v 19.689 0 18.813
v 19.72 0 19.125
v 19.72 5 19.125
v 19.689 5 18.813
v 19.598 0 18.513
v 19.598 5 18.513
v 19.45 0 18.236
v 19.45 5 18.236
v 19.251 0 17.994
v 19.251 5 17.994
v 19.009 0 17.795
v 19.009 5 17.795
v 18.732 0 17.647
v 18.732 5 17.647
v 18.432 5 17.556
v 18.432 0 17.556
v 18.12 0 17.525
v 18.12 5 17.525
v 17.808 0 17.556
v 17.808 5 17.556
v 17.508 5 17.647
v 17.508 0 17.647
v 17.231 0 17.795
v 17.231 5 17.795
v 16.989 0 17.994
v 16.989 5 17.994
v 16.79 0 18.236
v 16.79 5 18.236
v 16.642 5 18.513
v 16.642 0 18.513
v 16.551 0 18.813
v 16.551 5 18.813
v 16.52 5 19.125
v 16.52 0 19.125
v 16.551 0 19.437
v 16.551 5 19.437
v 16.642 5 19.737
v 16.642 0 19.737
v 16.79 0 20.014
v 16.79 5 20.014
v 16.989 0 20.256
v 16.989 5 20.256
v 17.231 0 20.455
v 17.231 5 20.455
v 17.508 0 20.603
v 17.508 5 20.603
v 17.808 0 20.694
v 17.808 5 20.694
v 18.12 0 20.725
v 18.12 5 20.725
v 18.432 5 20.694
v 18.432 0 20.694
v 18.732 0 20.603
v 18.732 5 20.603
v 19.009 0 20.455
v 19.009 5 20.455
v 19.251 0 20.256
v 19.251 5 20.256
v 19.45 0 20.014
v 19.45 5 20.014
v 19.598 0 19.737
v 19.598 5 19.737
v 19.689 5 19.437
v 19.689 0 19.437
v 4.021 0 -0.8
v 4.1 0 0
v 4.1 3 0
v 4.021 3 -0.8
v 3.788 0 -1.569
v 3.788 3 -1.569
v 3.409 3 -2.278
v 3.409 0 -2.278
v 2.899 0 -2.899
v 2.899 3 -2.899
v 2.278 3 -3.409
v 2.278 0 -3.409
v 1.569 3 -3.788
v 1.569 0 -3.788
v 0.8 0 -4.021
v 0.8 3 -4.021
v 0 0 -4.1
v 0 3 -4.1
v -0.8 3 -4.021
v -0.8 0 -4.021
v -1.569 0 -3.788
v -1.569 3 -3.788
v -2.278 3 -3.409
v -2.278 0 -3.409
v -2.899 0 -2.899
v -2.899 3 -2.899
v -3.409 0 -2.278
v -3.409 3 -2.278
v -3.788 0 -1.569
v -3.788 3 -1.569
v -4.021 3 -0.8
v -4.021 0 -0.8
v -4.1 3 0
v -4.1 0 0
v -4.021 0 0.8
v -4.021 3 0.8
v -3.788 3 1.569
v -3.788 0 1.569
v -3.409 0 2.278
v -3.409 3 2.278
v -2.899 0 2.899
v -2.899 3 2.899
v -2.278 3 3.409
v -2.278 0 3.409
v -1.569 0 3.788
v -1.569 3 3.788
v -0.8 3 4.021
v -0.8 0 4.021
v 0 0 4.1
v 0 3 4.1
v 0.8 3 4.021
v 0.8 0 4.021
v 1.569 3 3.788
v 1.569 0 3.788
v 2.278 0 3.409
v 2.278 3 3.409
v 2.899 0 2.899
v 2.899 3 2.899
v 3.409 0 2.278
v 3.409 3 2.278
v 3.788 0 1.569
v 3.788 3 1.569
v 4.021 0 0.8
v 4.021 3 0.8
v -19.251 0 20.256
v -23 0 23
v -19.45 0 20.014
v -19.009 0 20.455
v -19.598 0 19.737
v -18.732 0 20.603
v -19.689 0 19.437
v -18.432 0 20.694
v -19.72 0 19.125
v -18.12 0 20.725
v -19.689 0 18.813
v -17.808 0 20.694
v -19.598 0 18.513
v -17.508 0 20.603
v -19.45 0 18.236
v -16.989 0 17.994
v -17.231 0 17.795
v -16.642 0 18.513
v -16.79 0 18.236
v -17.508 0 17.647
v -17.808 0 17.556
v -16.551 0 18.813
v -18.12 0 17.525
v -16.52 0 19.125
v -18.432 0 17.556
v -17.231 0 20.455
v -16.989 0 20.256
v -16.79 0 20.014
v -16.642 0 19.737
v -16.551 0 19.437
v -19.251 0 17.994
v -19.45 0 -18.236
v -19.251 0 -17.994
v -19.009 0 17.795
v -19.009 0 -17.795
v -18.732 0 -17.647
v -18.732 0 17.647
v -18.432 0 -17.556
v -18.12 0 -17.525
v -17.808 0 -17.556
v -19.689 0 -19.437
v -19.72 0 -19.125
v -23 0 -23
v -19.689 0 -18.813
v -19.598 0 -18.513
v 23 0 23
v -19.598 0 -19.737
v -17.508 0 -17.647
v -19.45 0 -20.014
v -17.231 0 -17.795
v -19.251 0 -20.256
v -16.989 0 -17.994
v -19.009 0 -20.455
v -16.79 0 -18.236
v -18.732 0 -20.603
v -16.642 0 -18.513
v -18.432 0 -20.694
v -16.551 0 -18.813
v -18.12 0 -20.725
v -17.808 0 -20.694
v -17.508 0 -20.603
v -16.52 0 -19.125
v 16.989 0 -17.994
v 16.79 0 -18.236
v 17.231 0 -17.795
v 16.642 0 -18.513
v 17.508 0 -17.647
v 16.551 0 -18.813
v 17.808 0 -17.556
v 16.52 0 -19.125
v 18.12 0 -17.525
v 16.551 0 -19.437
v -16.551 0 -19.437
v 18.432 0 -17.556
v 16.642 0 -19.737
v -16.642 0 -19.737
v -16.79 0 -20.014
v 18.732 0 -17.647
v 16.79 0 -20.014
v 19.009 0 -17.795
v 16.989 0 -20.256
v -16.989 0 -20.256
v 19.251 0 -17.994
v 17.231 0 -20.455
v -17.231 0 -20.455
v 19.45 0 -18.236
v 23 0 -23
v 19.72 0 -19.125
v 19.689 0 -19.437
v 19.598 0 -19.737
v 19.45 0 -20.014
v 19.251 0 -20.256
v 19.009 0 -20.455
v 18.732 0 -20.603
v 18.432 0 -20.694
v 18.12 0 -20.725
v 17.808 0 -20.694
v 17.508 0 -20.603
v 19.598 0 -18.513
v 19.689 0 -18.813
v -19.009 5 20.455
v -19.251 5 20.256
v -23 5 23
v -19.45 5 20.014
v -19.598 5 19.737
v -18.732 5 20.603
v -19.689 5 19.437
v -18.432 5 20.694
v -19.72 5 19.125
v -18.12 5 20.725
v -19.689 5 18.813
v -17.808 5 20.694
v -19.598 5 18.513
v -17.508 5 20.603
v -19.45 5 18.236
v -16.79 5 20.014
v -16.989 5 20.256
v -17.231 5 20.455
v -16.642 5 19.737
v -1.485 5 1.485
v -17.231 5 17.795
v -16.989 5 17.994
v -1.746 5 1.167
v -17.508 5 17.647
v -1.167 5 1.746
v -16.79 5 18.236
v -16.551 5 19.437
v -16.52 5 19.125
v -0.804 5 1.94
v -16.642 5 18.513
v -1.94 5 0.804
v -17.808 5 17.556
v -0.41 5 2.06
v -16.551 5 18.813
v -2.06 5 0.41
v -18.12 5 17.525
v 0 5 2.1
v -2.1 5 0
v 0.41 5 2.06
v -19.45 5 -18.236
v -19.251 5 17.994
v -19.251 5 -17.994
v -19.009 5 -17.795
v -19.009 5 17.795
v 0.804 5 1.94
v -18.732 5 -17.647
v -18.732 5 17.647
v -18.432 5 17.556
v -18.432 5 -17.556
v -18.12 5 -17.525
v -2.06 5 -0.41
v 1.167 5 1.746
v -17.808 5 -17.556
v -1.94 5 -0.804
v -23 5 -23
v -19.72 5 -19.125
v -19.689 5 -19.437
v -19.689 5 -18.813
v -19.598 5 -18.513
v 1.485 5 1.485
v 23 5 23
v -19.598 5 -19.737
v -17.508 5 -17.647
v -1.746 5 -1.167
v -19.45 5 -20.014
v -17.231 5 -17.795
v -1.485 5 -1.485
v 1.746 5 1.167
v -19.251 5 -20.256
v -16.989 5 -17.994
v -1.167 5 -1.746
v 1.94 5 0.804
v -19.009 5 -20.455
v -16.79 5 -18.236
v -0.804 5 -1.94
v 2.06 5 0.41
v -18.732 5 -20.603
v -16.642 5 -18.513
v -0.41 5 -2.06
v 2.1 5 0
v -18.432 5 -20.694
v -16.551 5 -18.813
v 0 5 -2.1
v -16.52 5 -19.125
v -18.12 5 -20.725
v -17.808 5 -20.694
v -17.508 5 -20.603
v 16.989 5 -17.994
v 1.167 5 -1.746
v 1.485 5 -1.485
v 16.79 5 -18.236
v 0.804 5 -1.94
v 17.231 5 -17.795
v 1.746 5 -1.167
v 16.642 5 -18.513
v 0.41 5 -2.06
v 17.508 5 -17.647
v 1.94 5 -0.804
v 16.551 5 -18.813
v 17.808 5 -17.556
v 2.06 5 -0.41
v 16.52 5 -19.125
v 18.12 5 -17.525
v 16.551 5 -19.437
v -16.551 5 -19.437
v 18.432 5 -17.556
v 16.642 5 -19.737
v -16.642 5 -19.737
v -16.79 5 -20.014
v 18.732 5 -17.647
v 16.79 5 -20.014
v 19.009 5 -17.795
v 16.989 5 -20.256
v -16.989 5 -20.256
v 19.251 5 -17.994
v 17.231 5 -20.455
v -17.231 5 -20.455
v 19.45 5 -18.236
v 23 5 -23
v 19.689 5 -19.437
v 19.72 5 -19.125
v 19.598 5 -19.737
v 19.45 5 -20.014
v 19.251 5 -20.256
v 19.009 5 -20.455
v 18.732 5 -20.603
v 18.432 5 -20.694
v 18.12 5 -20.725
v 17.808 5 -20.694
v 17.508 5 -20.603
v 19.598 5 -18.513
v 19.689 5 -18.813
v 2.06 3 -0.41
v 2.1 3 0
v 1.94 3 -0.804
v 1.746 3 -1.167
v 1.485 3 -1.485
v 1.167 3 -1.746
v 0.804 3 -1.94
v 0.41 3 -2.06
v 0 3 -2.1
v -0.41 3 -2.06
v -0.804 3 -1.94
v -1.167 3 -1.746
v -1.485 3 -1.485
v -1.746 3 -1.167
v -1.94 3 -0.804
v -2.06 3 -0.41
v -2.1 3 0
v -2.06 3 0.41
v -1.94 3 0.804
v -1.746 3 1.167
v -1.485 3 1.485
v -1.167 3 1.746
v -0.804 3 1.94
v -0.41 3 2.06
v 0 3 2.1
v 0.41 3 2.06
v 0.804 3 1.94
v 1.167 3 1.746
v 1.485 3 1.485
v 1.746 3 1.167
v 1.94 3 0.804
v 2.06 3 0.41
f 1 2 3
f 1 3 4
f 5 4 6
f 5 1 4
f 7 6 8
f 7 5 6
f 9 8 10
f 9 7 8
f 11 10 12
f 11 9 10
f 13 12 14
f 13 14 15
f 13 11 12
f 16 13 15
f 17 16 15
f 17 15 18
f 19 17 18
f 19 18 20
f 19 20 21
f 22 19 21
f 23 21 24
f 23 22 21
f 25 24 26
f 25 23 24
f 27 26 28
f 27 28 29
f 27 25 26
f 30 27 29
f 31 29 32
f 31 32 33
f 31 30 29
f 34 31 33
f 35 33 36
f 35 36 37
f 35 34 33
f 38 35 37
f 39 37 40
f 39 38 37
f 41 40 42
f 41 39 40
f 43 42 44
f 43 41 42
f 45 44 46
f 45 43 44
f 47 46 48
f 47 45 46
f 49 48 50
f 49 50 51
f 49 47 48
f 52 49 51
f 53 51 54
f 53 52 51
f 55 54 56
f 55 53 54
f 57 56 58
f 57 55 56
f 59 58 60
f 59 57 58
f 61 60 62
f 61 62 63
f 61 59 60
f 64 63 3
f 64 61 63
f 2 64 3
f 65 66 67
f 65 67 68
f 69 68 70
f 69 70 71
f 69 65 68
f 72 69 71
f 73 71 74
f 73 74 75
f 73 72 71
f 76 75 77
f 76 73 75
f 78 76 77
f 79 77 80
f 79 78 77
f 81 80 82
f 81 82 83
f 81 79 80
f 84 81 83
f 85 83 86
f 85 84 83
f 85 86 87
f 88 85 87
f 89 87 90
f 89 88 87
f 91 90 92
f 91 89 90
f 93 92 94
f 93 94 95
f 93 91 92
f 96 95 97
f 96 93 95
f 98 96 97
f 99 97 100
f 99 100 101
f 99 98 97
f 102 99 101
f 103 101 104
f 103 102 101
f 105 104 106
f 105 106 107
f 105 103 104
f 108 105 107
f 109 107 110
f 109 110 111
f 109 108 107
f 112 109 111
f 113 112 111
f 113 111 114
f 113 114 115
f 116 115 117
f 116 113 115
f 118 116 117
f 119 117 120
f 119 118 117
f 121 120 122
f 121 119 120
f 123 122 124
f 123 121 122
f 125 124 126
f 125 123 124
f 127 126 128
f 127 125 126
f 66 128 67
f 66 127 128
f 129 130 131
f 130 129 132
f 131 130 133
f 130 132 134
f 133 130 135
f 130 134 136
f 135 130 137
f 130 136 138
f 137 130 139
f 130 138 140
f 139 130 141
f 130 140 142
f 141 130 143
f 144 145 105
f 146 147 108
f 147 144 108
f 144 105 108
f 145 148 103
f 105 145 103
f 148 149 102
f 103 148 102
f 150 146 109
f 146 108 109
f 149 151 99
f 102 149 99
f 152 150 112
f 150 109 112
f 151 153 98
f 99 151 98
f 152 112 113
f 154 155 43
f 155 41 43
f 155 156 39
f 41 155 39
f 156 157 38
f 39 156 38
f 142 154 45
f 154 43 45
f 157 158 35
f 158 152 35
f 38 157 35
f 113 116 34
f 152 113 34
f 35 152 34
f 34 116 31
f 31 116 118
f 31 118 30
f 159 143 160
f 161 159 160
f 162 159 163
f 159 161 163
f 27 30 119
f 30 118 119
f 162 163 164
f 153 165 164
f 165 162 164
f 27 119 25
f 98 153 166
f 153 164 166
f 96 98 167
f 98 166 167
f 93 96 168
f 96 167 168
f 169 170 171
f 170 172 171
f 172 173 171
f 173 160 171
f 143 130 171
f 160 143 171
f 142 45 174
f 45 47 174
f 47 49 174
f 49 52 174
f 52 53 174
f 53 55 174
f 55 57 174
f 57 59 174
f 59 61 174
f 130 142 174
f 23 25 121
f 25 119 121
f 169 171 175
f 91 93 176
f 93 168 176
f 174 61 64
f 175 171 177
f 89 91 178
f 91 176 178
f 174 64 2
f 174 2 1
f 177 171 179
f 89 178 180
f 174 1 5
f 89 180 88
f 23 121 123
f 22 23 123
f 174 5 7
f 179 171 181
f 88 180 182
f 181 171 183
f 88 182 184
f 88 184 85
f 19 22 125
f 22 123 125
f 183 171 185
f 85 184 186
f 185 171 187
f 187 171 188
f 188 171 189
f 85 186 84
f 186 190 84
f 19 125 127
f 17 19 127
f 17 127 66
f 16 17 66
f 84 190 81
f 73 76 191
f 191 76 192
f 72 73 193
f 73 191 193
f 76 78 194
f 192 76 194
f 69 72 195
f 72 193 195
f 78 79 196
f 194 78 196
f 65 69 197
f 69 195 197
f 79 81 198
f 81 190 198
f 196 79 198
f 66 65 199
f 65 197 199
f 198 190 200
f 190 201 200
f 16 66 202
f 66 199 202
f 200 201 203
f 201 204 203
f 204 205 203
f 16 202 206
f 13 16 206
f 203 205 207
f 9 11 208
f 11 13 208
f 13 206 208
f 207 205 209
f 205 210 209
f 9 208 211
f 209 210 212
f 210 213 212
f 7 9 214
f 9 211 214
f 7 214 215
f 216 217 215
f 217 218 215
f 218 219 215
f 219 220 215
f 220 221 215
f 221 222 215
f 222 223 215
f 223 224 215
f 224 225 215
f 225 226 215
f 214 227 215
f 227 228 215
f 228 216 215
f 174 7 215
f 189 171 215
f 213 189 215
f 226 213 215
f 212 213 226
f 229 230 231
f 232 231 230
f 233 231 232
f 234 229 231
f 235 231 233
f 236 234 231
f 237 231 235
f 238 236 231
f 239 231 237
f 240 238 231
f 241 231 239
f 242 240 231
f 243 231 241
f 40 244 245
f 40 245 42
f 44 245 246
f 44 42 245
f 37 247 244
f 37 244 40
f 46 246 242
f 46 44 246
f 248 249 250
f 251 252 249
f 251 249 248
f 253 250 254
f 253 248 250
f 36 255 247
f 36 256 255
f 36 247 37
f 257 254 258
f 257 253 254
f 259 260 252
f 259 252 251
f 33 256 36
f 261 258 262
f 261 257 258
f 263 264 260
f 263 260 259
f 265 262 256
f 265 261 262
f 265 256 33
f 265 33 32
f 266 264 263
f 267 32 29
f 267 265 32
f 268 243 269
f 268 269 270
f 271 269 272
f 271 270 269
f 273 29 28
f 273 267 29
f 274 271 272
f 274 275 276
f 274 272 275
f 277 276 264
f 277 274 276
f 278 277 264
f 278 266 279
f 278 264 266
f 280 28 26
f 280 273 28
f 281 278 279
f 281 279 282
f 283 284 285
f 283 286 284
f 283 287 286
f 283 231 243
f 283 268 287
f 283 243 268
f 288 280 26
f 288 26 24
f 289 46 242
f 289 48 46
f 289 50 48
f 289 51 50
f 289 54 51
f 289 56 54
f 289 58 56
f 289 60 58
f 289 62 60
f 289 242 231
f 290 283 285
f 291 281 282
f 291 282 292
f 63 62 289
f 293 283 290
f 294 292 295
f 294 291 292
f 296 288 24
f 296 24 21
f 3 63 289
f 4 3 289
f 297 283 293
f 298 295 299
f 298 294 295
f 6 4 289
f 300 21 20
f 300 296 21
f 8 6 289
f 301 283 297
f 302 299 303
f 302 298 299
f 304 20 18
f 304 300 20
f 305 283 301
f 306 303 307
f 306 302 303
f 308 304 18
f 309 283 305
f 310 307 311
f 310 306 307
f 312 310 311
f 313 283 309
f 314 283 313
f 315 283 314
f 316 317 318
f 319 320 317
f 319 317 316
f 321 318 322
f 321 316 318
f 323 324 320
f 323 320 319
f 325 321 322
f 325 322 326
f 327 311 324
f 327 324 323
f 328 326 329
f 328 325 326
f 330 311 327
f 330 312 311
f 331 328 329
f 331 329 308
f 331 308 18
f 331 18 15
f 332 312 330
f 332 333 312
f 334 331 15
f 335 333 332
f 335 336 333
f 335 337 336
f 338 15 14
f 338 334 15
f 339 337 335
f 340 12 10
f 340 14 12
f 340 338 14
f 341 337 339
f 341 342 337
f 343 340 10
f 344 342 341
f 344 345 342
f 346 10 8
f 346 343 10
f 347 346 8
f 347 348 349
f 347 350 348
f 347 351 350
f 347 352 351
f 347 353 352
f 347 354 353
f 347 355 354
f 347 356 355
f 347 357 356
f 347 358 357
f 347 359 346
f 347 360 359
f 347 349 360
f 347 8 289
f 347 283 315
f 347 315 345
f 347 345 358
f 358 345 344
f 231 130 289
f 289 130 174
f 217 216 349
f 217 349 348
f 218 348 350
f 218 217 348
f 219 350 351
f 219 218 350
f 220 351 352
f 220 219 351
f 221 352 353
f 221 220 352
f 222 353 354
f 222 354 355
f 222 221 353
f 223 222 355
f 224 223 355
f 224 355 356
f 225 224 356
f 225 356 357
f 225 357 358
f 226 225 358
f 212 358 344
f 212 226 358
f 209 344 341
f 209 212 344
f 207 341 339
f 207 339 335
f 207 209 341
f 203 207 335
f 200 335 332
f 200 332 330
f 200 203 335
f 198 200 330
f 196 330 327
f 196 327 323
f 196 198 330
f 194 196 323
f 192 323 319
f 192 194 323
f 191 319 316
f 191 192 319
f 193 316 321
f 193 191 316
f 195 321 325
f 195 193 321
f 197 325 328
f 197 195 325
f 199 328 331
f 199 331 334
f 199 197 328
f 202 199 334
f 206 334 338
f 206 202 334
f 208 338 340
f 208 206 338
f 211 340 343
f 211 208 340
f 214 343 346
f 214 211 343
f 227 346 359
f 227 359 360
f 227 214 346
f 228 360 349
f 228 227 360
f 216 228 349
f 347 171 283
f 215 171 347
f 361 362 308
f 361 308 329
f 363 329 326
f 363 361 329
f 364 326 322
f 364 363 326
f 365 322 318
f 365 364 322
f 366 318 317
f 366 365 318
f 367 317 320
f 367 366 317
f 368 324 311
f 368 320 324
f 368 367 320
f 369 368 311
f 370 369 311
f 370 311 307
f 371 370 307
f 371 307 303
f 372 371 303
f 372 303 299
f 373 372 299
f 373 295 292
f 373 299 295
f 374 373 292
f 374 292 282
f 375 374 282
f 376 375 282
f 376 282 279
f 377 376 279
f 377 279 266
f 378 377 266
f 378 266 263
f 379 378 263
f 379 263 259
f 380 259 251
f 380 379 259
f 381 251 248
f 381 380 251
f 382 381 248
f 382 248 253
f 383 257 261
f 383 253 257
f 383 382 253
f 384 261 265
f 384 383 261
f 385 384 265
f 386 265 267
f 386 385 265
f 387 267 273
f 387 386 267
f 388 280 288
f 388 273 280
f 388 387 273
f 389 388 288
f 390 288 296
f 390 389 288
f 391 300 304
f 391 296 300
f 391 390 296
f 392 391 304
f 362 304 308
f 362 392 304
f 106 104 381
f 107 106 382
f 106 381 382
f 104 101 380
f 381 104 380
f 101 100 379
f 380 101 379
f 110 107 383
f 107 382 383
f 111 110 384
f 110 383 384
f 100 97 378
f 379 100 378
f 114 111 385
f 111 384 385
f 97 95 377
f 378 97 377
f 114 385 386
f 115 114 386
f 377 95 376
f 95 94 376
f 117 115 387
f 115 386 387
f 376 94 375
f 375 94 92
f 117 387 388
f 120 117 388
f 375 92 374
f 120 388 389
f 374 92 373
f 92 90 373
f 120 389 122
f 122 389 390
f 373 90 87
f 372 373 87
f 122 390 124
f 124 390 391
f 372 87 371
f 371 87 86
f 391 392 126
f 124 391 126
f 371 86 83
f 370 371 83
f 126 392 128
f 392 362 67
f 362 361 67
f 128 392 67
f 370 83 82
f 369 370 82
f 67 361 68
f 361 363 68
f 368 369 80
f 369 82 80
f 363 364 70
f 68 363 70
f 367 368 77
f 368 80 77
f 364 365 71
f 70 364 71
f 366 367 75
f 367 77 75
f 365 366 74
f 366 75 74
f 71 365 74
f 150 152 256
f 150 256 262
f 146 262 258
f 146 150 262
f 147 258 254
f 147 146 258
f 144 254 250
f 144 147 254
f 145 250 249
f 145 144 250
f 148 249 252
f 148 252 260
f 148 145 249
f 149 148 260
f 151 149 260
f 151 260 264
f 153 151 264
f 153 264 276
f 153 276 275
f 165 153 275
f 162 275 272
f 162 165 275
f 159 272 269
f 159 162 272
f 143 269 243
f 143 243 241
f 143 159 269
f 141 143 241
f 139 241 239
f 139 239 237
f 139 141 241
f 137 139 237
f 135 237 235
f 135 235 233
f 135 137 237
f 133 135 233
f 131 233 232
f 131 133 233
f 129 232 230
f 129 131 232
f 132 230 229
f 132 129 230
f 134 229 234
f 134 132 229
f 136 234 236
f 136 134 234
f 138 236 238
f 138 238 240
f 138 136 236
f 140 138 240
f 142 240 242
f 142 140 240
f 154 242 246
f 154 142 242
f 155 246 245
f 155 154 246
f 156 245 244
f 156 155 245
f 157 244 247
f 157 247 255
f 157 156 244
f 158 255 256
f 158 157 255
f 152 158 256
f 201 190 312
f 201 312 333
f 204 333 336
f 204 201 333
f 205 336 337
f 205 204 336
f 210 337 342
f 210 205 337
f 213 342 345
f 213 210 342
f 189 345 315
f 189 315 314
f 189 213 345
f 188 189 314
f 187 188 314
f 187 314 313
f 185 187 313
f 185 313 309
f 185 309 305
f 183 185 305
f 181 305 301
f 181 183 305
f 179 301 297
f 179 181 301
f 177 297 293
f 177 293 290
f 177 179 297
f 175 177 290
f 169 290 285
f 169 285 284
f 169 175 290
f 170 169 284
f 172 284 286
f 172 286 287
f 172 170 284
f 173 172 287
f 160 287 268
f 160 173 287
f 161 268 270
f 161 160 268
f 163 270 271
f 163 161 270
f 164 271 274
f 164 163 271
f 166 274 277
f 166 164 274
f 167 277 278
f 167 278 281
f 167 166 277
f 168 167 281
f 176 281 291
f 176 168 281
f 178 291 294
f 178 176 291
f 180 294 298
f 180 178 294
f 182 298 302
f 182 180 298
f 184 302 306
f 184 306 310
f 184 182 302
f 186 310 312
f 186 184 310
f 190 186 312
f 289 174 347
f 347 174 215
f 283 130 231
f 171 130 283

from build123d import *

# Parameters (mm, degrees)
SKETCH2_W           = 46
SKETCH2_H           = 46
BOSS_EXTRUDE1_DEPTH = 5
SKETCH4_R           = 4.1
CUT_EXTRUDE2_DEPTH  = 3
SKETCH5_R           = 2.1
CUT_EXTRUDE4_DEPTH  = 6
SKETCH6_R           = 1.6
CUT_EXTRUDE5_DEPTH  = 5


with BuildPart() as part:
    # Sketch2 → Boss-Extrude1 (new body)
    with BuildSketch(Plane(origin=(0, 0, 0), x_dir=(1, 0, 0), z_dir=(0, 1, 0))):
        Rectangle(SKETCH2_W, SKETCH2_H)
    extrude(amount=BOSS_EXTRUDE1_DEPTH)

    # Sketch4 → Cut-Extrude2 (cut)
    with BuildSketch(Plane(origin=(0, 0, 0), x_dir=(1, 0, 0), z_dir=(0, 1, 0))):
        Circle(SKETCH4_R)
    extrude(amount=CUT_EXTRUDE2_DEPTH, mode=Mode.SUBTRACT)

    # Sketch5 → Cut-Extrude4 (cut, through all)
    with BuildSketch(Plane(origin=(0, 0, 0), x_dir=(1, 0, 0), z_dir=(0, 1, 0))):
        Circle(SKETCH5_R)
    extrude(amount=CUT_EXTRUDE4_DEPTH, mode=Mode.SUBTRACT)

    # Sketch6 → Cut-Extrude5 (cut)
    with BuildSketch(Plane(origin=(0, 0, 0), x_dir=(1, 0, 0), z_dir=(0, 1, 0))):
        with Locations((18.12, 19.125)):
            Circle(SKETCH6_R)
        with Locations((-18.12, 19.125)):
            Circle(SKETCH6_R)
        with Locations((-18.12, -19.125)):
            Circle(SKETCH6_R)
        with Locations((18.12, -19.125)):
            Circle(SKETCH6_R)
    extrude(amount=CUT_EXTRUDE5_DEPTH, mode=Mode.SUBTRACT)


solid = part.part
